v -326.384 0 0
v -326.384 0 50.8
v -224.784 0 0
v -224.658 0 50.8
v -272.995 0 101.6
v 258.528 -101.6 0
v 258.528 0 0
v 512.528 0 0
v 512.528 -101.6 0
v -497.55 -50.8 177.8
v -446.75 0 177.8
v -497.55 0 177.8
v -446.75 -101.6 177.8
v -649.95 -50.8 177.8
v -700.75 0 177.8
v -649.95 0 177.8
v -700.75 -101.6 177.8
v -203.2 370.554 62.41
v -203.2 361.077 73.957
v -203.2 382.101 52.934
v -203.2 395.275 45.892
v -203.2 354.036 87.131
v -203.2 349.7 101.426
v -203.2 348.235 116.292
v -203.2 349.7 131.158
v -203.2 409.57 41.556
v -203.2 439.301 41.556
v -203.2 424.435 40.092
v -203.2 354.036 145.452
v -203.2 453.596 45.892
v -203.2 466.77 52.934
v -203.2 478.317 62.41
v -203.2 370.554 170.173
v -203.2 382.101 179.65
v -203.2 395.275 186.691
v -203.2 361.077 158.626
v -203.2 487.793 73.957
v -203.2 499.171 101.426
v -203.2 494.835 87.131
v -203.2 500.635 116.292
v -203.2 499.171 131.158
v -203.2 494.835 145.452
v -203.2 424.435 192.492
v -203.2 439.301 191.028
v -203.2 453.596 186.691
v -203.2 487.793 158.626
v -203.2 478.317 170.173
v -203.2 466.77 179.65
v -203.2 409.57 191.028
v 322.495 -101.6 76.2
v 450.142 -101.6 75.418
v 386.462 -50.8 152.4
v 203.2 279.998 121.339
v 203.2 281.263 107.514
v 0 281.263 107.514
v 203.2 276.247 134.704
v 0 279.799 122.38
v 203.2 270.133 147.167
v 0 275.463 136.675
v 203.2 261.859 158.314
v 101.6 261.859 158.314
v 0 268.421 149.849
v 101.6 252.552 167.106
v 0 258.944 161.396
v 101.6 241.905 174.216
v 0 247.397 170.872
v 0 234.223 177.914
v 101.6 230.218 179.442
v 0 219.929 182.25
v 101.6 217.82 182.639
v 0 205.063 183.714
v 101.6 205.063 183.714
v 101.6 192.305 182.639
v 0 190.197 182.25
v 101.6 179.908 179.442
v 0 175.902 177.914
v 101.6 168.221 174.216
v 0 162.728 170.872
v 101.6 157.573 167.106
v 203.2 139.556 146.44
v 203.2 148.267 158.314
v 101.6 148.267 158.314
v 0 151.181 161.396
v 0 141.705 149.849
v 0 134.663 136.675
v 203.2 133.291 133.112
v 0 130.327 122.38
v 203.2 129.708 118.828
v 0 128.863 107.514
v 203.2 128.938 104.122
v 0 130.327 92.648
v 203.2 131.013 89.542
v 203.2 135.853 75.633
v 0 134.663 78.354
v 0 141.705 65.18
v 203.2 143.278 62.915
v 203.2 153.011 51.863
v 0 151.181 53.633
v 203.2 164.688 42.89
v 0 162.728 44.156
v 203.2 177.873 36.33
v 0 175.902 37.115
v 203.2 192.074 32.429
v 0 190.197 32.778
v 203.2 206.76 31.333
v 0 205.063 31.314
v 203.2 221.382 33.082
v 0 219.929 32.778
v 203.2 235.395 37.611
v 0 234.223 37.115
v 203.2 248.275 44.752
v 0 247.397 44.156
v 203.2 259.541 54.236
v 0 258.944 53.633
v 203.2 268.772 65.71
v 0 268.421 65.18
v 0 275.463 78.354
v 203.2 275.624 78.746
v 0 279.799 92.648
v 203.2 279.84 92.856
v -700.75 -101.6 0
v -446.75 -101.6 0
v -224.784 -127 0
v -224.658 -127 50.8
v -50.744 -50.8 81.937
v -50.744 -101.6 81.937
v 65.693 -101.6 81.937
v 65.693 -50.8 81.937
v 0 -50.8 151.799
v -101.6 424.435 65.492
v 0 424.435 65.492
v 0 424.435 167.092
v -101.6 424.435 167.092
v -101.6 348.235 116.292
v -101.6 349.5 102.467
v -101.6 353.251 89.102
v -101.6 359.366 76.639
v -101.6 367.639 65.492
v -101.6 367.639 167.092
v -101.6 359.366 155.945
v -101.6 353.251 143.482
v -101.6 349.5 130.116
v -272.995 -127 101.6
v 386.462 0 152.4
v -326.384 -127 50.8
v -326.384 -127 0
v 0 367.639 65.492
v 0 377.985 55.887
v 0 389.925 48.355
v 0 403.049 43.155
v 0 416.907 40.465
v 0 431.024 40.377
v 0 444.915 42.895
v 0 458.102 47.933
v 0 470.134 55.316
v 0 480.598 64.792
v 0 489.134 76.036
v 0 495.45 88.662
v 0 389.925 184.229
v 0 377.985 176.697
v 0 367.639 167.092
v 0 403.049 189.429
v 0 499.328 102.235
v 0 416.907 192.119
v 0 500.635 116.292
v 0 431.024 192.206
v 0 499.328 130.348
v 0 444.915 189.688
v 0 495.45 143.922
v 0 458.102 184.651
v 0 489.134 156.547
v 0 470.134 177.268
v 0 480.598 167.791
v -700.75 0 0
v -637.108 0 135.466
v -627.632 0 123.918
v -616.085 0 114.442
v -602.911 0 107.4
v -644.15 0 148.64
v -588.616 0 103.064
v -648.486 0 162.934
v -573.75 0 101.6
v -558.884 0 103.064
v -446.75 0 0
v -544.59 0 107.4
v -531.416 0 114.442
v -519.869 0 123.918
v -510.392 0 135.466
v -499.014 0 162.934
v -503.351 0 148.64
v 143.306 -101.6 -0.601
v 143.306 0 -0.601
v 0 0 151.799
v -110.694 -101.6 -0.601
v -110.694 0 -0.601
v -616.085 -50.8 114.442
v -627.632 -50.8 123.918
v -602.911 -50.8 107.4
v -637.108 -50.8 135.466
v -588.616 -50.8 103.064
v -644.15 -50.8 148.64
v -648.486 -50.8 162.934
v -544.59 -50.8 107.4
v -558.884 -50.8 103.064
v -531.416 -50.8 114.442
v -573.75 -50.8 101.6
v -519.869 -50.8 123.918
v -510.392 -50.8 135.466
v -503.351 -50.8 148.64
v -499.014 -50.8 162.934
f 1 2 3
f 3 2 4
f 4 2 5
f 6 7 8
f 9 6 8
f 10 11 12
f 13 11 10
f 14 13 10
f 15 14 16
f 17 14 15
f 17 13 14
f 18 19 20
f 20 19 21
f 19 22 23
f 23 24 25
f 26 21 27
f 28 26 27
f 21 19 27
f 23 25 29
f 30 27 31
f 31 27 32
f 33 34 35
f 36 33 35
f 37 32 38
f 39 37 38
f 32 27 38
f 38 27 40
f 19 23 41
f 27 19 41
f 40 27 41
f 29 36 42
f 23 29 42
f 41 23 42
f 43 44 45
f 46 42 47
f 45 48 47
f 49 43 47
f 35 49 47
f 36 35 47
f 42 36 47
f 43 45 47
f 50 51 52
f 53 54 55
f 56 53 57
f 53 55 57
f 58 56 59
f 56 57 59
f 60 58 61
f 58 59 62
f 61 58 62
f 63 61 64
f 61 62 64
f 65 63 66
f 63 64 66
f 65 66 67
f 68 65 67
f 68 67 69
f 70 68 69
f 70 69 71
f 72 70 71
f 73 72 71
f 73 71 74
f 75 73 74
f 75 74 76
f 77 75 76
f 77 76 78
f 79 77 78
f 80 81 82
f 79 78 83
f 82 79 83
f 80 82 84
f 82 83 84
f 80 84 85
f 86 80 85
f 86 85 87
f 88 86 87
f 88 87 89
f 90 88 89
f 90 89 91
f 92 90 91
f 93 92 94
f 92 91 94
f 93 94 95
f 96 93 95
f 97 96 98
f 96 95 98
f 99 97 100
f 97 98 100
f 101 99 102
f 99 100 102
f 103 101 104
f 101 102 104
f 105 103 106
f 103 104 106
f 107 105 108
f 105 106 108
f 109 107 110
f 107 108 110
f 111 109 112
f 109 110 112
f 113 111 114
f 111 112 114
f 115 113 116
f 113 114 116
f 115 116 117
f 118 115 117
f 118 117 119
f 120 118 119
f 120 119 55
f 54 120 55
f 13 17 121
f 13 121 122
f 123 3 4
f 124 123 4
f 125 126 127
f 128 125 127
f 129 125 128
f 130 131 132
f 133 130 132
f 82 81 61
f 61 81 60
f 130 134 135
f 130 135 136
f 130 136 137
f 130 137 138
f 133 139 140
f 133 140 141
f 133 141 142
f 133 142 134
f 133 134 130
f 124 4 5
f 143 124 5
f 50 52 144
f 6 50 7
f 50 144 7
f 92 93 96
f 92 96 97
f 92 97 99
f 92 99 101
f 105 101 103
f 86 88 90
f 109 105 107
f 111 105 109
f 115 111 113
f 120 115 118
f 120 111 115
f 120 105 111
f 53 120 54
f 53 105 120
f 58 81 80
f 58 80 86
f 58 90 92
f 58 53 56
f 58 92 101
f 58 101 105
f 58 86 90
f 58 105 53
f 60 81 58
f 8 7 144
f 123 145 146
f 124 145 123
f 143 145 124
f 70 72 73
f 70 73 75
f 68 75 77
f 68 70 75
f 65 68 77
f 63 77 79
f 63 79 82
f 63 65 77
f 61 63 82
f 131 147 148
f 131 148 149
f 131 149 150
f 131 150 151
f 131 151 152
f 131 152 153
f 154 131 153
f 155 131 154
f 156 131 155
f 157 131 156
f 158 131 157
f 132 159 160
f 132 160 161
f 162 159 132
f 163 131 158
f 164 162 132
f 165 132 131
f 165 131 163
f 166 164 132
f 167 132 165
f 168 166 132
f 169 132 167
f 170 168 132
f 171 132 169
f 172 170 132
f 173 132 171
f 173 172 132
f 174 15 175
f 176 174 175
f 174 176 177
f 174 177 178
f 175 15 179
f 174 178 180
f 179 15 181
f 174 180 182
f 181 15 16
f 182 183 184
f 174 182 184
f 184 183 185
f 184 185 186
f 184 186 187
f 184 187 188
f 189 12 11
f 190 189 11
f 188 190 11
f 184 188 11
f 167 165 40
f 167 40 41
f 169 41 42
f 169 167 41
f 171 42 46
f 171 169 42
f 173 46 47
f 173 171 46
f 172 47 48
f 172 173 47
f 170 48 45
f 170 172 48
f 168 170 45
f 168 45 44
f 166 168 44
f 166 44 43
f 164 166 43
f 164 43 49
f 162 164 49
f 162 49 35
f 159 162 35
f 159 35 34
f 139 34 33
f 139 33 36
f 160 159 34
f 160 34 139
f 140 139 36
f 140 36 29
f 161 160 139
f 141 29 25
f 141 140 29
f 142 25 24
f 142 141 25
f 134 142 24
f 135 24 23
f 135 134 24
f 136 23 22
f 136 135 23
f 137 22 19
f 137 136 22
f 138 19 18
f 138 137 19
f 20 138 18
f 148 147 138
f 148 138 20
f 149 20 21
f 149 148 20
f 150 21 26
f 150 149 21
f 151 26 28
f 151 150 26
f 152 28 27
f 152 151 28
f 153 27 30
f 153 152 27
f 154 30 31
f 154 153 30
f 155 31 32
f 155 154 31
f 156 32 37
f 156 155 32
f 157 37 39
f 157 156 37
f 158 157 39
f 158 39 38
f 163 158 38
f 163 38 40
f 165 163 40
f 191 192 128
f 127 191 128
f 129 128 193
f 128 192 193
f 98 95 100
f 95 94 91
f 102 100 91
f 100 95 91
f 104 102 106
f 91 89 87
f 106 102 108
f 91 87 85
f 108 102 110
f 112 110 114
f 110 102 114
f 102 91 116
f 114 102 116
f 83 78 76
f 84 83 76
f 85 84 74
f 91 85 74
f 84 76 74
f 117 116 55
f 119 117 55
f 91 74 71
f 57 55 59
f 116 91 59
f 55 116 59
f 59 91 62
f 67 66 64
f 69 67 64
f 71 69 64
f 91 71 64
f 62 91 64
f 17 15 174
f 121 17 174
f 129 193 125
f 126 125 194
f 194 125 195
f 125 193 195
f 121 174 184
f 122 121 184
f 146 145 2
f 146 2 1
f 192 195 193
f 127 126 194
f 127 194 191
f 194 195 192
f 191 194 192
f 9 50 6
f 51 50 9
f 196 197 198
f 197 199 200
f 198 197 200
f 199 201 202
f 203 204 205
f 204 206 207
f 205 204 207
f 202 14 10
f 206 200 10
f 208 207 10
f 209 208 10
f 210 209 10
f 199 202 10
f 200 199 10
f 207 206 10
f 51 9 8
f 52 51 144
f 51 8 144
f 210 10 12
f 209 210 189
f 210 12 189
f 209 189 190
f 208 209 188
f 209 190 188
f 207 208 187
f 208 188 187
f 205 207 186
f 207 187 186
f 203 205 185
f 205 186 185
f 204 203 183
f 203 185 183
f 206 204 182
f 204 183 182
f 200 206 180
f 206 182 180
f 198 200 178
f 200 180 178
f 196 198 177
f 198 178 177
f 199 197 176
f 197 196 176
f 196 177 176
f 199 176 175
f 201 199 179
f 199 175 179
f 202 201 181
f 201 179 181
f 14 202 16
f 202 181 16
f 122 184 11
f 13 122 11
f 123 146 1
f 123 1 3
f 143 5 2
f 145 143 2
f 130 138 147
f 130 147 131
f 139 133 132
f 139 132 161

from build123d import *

# Parameters (mm, degrees)
F1_DEPTH  = 101.6
F3_DEPTH  = 50.8
F5_DEPTH  = 101.6
F9_DEPTH  = 177.8
F11_DEPTH = 127
F16_R     = 76.2
F17_DEPTH = 203.2
F19_DEPTH = 101.6
F20_R     = 76.2
F21_DEPTH = 203.2
F23_DEPTH = 101.6
F25_DEPTH = 101.6
F27_DEPTH = 50.8


# Not quite as in the source:
# - the program builds the solid bodies; features that only make, move or delete a surface that nothing else refers to are left out


with BuildPart() as f1:
    # F0 (on Front) → F1 (new body)
    with BuildSketch(Plane.XZ):
        Polygon((0, 151.7990483895), (-110.6943220668, -0.6009516105), (143.3056779332, -0.6009516105), align=None)
    extrude(amount=F1_DEPTH)

    # F2 (on face) → F3 (cut)
    with BuildSketch(Plane.XZ.offset(101.6)):
        Polygon((-50.7436143692, 81.9370474714), (0, 81.9370474714), (65.6930538277, 81.9370474714), (0, 151.7990483895), align=None)
    extrude(amount=-F3_DEPTH, mode=Mode.SUBTRACT)


with BuildPart() as f5:
    # F4 (on Front) → F5 (new body)
    with BuildSketch(Plane.XZ):
        Polygon((386.4619200636, 152.4), (258.5280877834, 0), (512.5280877834, 0), align=None)
    extrude(amount=F5_DEPTH)

    # F8 (on 3pt) → F9 (cut, symmetric)
    with BuildSketch(Plane(origin=(385.5136131508, 0, -2.362237903), x_dir=(0, 1, 0), z_dir=(0.9999812273, 0, -0.0061273934))):
        Polygon((-50.8, 154.765143255), (-101.6, 154.765143255), (-101.6, 78.1746232731), align=None)
    extrude(amount=F9_DEPTH, both=True, mode=Mode.SUBTRACT)


with BuildPart() as f11:
    # F10 (on Front) → F11 (new body)
    with BuildSketch(Plane.XZ):
        Polygon((-326.3838480476, 0), (-224.7838480476, 0), (-224.6583398959, 50.8), (-272.99527684, 101.6), (-326.3838480476, 50.8), align=None)
    extrude(amount=F11_DEPTH)


with BuildPart() as f17:
    # F16 (on Right) → F17 (new body)
    with BuildSketch(Plane.YZ):
        with Locations((205.0628811121, 107.5141951442)):
            Circle(F16_R)
    extrude(amount=F17_DEPTH)

    # F18 (on face) → F19 (cut)
    with BuildSketch(Plane.YZ.offset(203.2)):
        with BuildLine():
            ThreePointArc((205.0628811121, 183.7141951442), (173.9543613788, 177.0749599473), (148.2667544836, 158.3141951442))
            Line((148.2667544836, 158.3141951442), (205.0628811121, 158.3141951442))
            Line((205.0628811121, 158.3141951442), (205.0628811121, 183.7141951442))
        make_face()
        with BuildLine():
            Line((205.0628811121, 183.7141951442), (205.0628811121, 158.3141951442))
            Line((205.0628811121, 158.3141951442), (261.8590077406, 158.3141951442))
            ThreePointArc((261.8590077406, 158.3141951442), (236.1714008454, 177.0749599473), (205.0628811121, 183.7141951442))
        make_face()
    extrude(amount=-F19_DEPTH, mode=Mode.SUBTRACT)


with BuildPart() as f21:
    # F20 (on Right) → F21 (new body)
    with BuildSketch(Plane.YZ):
        with Locations((424.4354069233, 116.2917613983)):
            Circle(F20_R)
    extrude(amount=-F21_DEPTH)

    # F22 (on face) → F23 (cut)
    with BuildSketch(Plane.YZ):
        with BuildLine():
            Line((424.4354069233, 65.4917613983), (424.4354069233, 116.2917613983))
            Line((424.4354069233, 116.2917613983), (424.4354069233, 167.0917613983))
            Line((424.4354069233, 167.0917613983), (367.6392802948, 167.0917613983))
            ThreePointArc((367.6392802948, 167.0917613983), (348.2354069233, 116.2917613983), (367.6392802948, 65.4917613983))
            Line((367.6392802948, 65.4917613983), (424.4354069233, 65.4917613983))
        make_face()
    extrude(amount=-F23_DEPTH, mode=Mode.SUBTRACT)


with BuildPart() as f25:
    # F24 (on Front) → F25 (new body)
    with BuildSketch(Plane.XZ):
        with BuildLine():
            Line((-700.7503095217, 0), (-446.7503095217, 0))
            Line((-446.7503095217, 0), (-446.7503095217, 177.8))
            Line((-446.7503095217, 177.8), (-497.5503095217, 177.8))
            ThreePointArc((-497.5503095217, 177.8), (-573.7503095217, 101.6), (-649.9503095217, 177.8))
            Line((-649.9503095217, 177.8), (-700.7503095217, 177.8))
            Line((-700.7503095217, 177.8), (-700.7503095217, 0))
        make_face()
    extrude(amount=F25_DEPTH)

    # F26 (on face) → F27 (join)
    with BuildSketch(Plane.XZ.offset(101.6)):
        with BuildLine():
            ThreePointArc((-649.9503095217, 177.8), (-573.7503095217, 101.6), (-497.5503095217, 177.8))
            Line((-497.5503095217, 177.8), (-649.9503095217, 177.8))
        make_face()
    extrude(amount=-F27_DEPTH)


solid = Compound([f1.part, f5.part, f11.part, f17.part, f21.part, f25.part])
